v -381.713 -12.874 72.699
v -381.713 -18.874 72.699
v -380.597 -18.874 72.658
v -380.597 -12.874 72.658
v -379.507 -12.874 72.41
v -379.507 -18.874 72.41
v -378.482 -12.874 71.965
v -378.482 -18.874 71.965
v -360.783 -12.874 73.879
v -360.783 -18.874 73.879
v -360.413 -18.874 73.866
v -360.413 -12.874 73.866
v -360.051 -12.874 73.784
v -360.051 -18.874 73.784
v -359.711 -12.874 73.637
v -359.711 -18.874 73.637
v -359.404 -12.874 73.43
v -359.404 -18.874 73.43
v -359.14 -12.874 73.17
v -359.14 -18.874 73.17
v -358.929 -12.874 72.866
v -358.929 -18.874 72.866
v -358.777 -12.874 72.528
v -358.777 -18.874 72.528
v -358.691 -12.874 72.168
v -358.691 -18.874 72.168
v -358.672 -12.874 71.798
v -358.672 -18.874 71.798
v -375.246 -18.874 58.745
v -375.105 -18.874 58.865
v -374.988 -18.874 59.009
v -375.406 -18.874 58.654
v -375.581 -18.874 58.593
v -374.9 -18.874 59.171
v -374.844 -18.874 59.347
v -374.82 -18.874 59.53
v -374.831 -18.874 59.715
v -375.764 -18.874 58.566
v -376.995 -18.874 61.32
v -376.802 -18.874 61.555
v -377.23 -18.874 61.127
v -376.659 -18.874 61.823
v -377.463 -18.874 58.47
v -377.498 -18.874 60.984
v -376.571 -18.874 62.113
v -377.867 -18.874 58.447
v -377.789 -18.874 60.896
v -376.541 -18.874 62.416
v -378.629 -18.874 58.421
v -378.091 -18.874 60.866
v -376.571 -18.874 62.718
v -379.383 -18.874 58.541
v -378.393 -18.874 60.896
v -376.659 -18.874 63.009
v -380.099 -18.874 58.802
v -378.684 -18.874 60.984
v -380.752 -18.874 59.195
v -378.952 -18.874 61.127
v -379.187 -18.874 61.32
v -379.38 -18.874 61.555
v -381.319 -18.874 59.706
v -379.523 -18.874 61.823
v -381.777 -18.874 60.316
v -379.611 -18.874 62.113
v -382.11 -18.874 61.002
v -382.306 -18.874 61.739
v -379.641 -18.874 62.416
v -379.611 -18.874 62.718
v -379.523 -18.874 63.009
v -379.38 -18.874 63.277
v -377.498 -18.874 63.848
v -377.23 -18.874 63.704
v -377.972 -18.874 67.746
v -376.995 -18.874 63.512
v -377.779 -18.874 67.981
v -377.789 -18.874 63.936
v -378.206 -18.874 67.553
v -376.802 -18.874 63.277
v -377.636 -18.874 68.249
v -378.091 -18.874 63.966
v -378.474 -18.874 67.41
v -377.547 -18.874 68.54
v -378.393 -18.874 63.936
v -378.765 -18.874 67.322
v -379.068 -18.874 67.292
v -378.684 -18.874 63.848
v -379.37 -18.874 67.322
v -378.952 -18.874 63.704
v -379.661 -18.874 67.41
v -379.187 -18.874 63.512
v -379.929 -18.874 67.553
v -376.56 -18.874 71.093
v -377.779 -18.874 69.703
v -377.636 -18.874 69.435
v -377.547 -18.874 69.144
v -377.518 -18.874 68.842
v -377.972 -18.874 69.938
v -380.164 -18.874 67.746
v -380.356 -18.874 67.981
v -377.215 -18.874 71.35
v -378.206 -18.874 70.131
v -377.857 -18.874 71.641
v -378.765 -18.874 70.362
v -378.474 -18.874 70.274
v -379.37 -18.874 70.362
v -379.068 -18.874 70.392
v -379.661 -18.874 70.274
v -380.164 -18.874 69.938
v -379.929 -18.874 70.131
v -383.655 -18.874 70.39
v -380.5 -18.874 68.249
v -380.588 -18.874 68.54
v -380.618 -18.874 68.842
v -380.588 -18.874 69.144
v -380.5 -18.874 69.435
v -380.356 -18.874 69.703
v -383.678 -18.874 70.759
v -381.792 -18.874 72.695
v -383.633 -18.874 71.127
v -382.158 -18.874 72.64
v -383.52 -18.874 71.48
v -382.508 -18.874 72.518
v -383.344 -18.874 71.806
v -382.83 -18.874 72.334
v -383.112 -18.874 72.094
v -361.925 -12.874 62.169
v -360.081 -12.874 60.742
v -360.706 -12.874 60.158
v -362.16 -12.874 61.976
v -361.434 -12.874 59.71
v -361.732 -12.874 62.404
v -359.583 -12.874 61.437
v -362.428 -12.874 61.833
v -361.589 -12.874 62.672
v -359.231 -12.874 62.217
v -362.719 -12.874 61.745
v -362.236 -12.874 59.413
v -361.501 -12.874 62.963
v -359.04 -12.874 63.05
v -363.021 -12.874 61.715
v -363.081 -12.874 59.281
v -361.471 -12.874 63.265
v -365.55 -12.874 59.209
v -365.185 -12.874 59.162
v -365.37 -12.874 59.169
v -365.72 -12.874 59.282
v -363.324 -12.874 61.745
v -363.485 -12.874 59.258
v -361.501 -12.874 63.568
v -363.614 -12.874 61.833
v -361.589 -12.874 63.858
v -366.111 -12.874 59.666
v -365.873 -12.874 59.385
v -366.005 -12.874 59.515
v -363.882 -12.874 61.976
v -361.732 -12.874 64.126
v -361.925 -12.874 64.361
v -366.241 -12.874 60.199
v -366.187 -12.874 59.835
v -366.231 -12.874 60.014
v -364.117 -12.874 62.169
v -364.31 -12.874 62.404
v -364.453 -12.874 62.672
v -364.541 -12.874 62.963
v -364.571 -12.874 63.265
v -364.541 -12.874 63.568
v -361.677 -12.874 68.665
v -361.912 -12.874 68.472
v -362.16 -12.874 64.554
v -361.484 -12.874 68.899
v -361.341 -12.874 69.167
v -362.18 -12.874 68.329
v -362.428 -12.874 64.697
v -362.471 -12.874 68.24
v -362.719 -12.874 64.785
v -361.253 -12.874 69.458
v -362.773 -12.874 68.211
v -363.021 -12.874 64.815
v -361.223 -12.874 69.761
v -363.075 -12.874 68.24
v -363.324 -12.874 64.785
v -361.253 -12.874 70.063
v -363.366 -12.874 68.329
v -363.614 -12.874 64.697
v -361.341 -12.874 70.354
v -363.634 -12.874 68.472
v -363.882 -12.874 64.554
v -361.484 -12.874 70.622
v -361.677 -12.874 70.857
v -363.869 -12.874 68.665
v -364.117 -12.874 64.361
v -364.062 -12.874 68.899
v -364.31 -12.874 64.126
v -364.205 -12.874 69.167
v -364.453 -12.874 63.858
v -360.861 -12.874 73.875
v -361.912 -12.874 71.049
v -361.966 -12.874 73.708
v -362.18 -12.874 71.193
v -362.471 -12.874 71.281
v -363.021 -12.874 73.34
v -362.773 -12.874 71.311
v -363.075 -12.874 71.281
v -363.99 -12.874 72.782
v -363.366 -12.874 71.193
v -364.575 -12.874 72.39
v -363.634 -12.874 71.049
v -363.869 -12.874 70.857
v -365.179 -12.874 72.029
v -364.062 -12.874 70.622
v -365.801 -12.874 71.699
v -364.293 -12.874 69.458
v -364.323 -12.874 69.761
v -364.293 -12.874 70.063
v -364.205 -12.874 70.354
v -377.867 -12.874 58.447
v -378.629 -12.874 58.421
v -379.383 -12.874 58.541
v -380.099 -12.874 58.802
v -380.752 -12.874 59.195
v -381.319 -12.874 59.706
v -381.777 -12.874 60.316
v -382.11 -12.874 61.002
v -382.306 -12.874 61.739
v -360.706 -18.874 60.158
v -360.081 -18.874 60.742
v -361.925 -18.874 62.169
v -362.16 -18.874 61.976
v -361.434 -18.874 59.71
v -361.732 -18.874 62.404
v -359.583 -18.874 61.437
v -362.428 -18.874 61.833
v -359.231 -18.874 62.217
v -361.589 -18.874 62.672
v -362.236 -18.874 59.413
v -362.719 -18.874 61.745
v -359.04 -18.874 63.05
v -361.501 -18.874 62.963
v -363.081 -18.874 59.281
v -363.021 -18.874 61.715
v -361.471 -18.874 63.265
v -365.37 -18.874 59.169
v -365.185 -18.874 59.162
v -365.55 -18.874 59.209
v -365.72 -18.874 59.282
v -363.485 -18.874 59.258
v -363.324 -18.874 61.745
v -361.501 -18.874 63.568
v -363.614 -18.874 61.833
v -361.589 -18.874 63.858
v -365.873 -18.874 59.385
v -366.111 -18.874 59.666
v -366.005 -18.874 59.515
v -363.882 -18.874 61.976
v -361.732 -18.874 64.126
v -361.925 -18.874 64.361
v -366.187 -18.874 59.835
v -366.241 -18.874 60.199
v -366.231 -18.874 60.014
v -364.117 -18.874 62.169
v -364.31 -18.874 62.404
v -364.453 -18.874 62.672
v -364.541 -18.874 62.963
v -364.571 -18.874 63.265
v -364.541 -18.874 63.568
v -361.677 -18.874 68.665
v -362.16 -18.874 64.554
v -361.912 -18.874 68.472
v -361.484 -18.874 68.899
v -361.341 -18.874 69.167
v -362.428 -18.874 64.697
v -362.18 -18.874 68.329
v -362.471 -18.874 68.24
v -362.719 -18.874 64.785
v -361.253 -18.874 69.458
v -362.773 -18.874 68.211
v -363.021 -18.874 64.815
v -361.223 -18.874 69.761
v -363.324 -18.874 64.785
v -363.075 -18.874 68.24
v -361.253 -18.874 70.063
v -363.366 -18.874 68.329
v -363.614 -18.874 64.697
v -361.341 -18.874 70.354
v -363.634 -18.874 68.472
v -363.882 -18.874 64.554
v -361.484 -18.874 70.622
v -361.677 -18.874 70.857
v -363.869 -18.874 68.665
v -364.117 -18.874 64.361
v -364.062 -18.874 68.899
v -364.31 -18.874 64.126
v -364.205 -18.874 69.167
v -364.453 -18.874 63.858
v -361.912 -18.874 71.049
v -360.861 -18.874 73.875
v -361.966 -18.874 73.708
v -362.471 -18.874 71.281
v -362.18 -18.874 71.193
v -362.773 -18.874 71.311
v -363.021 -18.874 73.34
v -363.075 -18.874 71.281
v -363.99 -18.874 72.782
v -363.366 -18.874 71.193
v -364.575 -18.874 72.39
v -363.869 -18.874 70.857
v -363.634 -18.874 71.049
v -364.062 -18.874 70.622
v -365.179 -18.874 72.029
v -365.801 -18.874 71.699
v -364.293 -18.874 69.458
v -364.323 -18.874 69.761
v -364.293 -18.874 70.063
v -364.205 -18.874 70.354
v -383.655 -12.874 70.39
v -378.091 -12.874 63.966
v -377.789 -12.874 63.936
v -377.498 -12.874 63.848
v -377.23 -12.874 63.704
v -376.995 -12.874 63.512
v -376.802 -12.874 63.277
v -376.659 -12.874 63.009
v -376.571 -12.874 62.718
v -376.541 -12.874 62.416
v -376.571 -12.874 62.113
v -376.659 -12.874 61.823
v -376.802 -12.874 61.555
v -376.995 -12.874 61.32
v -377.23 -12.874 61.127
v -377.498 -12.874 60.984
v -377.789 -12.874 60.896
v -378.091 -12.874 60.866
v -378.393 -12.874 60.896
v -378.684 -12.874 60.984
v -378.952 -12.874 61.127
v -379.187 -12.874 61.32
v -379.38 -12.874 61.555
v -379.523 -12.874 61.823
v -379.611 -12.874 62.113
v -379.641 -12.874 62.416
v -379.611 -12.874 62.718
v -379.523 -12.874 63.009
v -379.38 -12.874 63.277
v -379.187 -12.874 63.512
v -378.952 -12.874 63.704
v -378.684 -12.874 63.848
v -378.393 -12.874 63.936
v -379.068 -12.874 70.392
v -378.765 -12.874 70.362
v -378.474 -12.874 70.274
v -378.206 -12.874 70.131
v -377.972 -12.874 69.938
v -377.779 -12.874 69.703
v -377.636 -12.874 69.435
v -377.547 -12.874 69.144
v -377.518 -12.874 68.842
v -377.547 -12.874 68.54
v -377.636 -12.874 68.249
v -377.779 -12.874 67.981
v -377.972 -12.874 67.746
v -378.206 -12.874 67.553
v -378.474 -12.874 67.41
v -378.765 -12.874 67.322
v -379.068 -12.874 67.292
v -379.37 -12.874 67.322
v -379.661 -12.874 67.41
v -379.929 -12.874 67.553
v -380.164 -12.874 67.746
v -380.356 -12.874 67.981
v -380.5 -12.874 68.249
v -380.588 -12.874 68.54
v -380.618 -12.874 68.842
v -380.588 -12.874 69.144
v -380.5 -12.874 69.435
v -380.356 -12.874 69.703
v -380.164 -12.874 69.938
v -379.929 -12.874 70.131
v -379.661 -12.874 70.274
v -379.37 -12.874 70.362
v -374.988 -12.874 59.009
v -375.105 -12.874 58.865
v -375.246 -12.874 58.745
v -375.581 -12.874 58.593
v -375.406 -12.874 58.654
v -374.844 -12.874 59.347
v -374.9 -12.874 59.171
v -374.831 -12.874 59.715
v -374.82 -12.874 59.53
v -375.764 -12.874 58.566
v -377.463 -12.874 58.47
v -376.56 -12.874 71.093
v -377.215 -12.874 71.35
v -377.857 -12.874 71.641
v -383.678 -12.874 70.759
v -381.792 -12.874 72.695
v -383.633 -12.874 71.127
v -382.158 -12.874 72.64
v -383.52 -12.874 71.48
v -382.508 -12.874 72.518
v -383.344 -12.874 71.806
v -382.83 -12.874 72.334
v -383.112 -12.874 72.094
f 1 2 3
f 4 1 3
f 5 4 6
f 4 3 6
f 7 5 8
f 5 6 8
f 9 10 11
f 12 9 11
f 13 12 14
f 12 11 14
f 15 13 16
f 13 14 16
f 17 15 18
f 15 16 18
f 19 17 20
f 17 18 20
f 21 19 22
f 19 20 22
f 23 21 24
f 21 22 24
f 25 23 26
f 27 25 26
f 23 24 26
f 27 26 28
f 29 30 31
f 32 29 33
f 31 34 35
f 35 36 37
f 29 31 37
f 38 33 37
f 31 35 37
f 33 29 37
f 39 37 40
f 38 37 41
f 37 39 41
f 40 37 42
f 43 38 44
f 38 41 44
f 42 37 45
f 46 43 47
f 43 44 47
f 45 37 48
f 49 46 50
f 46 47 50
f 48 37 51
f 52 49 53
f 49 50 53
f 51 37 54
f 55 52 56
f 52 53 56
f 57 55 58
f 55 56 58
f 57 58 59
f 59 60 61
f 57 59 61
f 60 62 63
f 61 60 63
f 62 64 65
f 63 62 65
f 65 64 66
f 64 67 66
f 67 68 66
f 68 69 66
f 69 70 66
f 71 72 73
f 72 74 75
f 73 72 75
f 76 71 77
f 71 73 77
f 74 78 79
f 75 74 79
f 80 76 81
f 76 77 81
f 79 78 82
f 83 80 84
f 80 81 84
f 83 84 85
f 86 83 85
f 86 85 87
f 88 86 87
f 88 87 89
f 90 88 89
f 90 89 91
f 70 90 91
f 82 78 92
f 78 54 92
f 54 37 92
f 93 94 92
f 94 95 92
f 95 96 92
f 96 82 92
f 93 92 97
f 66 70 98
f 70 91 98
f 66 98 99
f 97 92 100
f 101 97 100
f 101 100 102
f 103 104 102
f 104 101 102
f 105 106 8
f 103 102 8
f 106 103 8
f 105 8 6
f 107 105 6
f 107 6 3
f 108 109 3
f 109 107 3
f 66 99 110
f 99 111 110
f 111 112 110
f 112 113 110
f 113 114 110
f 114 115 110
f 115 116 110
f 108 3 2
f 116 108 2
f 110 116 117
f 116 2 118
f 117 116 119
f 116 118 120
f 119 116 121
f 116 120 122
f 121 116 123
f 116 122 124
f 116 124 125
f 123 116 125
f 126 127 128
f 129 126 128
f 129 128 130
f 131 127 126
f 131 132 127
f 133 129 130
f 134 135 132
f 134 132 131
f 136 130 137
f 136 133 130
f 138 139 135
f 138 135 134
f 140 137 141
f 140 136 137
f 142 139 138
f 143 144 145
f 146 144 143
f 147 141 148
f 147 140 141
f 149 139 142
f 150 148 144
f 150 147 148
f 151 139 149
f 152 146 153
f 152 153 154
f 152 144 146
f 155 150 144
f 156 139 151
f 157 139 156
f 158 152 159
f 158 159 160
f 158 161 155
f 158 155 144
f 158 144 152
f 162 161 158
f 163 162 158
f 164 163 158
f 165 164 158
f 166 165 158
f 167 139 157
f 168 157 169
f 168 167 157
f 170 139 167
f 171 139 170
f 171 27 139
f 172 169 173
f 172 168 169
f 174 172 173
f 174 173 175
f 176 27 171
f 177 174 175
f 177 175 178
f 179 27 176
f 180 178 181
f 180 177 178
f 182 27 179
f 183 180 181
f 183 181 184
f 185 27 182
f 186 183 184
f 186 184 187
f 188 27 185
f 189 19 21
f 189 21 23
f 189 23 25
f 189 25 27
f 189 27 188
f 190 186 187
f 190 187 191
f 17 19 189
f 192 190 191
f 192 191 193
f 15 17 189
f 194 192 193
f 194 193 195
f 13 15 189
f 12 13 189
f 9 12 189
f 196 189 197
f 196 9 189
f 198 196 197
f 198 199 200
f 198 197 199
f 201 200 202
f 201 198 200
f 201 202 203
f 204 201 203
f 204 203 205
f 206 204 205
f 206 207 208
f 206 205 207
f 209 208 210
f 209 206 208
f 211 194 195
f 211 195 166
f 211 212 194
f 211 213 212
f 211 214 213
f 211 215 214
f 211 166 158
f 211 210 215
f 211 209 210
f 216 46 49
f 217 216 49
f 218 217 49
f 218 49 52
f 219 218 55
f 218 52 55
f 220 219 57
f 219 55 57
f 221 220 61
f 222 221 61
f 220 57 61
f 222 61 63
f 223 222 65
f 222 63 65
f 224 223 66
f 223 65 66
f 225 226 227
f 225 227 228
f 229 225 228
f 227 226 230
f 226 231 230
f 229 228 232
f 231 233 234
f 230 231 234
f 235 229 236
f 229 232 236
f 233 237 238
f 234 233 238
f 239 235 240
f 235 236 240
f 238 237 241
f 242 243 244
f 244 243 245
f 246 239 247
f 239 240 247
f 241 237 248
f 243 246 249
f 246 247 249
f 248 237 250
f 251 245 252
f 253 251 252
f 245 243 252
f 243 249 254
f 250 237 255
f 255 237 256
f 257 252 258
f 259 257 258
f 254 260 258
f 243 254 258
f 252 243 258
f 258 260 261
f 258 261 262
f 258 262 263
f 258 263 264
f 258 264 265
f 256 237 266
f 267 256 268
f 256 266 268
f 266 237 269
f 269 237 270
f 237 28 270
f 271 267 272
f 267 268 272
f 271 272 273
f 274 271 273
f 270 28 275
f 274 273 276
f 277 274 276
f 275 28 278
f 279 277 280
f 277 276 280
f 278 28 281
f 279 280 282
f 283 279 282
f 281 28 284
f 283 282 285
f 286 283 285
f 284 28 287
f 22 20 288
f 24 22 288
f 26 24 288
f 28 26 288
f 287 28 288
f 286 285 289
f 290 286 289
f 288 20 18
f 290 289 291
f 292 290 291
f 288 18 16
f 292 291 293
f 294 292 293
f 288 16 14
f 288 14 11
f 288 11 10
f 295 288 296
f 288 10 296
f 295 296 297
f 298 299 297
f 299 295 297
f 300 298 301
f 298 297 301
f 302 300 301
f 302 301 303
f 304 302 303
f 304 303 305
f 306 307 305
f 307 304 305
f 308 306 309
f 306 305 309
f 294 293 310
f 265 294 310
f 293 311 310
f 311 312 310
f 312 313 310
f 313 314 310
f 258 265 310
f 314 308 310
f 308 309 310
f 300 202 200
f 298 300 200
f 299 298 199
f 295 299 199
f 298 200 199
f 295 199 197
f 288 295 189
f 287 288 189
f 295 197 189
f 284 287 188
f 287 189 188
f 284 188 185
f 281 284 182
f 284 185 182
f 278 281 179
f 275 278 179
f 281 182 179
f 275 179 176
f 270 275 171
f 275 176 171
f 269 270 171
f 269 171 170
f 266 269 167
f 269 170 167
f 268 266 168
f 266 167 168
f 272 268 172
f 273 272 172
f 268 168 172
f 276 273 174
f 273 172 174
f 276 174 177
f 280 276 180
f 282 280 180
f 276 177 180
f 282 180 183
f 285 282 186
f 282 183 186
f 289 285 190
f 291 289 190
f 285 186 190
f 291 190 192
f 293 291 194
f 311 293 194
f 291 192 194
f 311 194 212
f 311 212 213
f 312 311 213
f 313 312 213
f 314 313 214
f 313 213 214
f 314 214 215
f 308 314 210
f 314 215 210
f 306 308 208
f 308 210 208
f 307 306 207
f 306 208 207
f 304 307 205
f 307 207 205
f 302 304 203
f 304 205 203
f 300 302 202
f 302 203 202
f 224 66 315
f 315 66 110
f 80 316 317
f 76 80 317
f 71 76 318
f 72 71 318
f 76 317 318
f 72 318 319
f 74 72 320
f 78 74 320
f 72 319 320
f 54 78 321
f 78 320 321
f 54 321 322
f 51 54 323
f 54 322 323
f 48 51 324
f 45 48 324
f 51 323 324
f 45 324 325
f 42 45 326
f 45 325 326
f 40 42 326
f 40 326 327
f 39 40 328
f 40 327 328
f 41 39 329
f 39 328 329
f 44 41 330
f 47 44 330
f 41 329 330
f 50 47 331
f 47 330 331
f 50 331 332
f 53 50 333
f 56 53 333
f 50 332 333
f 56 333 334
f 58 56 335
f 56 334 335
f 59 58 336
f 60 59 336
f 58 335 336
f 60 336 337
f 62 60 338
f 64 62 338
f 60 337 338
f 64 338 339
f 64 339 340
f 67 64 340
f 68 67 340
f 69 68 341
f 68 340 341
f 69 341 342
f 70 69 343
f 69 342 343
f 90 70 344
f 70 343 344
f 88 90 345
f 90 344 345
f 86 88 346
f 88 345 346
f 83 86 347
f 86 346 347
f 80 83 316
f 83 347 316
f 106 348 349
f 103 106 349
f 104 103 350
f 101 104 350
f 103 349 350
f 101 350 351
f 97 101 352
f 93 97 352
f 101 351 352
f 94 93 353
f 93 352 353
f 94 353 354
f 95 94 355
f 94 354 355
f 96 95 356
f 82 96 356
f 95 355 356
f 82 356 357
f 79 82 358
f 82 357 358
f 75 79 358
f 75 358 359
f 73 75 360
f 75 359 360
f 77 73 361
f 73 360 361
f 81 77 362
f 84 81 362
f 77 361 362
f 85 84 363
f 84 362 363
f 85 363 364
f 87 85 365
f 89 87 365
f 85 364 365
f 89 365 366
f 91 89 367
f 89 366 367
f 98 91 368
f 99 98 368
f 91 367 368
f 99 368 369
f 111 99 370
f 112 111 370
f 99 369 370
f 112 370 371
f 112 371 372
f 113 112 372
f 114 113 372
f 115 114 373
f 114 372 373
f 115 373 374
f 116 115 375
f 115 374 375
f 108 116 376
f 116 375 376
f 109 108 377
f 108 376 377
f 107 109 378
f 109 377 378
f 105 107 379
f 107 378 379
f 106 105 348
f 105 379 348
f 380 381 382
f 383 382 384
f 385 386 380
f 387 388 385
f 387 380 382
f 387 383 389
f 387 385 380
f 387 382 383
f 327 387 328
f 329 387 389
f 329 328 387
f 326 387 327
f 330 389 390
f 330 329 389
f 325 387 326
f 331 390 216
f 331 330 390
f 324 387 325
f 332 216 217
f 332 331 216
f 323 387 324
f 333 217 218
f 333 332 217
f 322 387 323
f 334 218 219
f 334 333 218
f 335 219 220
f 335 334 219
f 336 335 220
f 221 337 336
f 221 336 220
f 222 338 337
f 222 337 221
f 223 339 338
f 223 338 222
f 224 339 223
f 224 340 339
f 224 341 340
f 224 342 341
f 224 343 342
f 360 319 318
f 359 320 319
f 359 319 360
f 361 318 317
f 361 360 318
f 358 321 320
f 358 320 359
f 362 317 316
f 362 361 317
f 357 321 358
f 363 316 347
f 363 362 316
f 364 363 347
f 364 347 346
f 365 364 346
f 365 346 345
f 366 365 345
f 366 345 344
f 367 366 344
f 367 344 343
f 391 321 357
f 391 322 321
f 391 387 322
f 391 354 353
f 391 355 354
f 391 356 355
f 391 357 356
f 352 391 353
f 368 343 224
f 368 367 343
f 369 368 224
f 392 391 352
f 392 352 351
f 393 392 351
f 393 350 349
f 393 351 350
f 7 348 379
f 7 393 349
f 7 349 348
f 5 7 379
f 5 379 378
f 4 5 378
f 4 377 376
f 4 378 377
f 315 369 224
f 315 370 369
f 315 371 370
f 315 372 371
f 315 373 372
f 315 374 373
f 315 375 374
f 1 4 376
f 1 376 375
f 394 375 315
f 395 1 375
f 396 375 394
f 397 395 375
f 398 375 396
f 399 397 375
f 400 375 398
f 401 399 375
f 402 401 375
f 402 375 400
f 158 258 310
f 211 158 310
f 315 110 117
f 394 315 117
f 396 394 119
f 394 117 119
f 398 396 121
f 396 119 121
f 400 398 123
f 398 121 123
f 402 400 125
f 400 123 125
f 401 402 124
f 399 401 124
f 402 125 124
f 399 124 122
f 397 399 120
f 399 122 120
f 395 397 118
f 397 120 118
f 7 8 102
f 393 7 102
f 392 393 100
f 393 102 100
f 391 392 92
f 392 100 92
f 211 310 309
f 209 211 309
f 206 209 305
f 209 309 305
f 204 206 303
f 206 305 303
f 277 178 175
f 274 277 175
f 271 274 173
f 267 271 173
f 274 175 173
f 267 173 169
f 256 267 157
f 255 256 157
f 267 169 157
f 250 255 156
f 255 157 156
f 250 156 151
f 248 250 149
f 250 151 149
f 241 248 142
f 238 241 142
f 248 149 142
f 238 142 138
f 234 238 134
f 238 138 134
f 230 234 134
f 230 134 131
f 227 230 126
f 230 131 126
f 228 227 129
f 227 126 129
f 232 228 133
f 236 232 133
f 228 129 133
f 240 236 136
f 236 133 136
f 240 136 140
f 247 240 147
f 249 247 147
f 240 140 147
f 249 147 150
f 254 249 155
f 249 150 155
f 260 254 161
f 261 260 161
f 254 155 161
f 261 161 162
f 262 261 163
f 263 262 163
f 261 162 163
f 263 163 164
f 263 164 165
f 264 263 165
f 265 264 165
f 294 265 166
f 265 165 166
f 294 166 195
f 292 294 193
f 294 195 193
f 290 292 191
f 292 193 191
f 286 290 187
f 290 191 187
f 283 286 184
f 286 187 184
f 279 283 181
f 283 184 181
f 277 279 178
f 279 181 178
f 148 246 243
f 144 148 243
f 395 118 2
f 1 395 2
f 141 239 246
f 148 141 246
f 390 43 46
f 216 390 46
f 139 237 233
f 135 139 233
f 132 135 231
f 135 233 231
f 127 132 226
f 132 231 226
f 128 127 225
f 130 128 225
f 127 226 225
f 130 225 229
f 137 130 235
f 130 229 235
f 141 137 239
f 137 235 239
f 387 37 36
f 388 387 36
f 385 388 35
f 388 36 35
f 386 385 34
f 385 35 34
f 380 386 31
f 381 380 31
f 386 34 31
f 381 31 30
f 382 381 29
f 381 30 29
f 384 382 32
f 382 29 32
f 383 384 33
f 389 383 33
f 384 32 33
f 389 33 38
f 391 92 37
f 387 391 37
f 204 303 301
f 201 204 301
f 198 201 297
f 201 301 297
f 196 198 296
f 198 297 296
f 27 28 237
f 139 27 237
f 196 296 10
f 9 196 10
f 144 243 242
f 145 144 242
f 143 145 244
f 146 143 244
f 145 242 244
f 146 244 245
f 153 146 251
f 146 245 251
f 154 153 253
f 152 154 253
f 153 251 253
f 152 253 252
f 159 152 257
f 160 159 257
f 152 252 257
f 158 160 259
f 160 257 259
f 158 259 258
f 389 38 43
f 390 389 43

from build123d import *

# Parameters (mm, degrees)
DODANIE_WYCI_GNI_CIE1_DEPTH   = 6
DODANIE_WYCI_GNI_CIE1_2_DEPTH = 6
SZKIC2_R                      = 1.55
WYTNIJ_WYCI_GNI_CIE1_DEPTH    = 6


with BuildPart() as part:
    # Szkic1 → Dodanie-wyciągnięcie1 (new body)
    with BuildSketch(Plane.XZ.offset(18.873993717)):
        with BuildLine():
            Line((-376.560022787, 71.092821297), (-374.831151718, 59.714534639))
            ThreePointArc((-374.831151718, 59.714534639), (-375.043393456, 58.934086873), (-375.763520627, 58.565899246))
            Line((-375.763520627, 58.565899246), (-377.463219092, 58.470082214))
            Line((-377.463219092, 58.470082214), (-377.867323557, 58.44730165))
            ThreePointArc((-377.867323557, 58.44730165), (-380.752416846, 59.195478513), (-382.306249359, 61.738928222))
            Line((-382.306249359, 61.738928222), (-383.655439175, 70.389689128))
            ThreePointArc((-383.655439175, 70.389689128), (-383.234620063, 71.955292457), (-381.791895571, 72.694716929))
            Line((-381.791895571, 72.694716929), (-381.713251764, 72.699150313))
            ThreePointArc((-381.713251764, 72.699150313), (-380.046026471, 72.55950463), (-378.482176857, 71.964932953))
            ThreePointArc((-378.482176857, 71.964932953), (-377.5379525, 71.491733437), (-376.560022787, 71.092821297))
        make_face()
    extrude(amount=-DODANIE_WYCI_GNI_CIE1_DEPTH)


with BuildPart() as body_2:
    # Szkic1 → Dodanie-wyci_gni_cie1 2 (new body)
    with BuildSketch(Plane.XZ.offset(18.873993717)):
        with BuildLine():
            Line((-366.240537331, 60.198833989), (-365.801162735, 71.699496113))
            ThreePointArc((-365.801162735, 71.699496113), (-364.874458275, 72.205709794), (-363.989579114, 72.781923572))
            ThreePointArc((-363.989579114, 72.781923572), (-362.502460733, 73.548487343), (-360.861493062, 73.874625653))
            Line((-360.861493062, 73.874625653), (-360.782849254, 73.879059037))
            ThreePointArc((-360.782849254, 73.879059037), (-359.266162416, 73.306465339), (-358.67205327, 71.798076519))
            Line((-358.67205327, 71.798076519), (-359.040446779, 63.050490359))
            ThreePointArc((-359.040446779, 63.050490359), (-360.378861081, 60.434579133), (-363.081307119, 59.280833149))
            Line((-363.081307119, 59.280833149), (-363.485411585, 59.258052584))
            Line((-363.485411585, 59.258052584), (-365.184982719, 59.162242731))
            ThreePointArc((-365.184982719, 59.162242731), (-365.941935052, 59.447170815), (-366.240537331, 60.198833989))
        make_face()
    extrude(amount=-DODANIE_WYCI_GNI_CIE1_2_DEPTH)


with BuildPart() as wytnij_wyci_gni_cie1_tool:
    # Szkic2 → Wytnij-wyciągnięcie1 (new body)
    with BuildSketch(Plane(origin=(0, -12.873993717, 0), x_dir=(-1, 0, 0), z_dir=(0, 1, 0))):
        with Locations(Location((378.091035143, 62.415721781, 0), (0, 0, 90))):
            Circle(SZKIC2_R)
        with Locations(Location((379.067604175, 68.841942515, 0), (0, 0, 90))):
            Circle(SZKIC2_R)
        with Locations(Location((363.021125314, 63.265257191, 0), (0, 0, 90))):
            Circle(SZKIC2_R)
        with Locations(Location((362.772978476, 69.760518782, 0), (0, 0, 90))):
            Circle(SZKIC2_R)
    extrude(amount=-WYTNIJ_WYCI_GNI_CIE1_DEPTH)


with BuildPart() as part_1:
    add(part.part)

    # Wytnij-wyciągnięcie1: cut by wytnij_wyci_gni_cie1_tool
    add(wytnij_wyci_gni_cie1_tool.part, mode=Mode.SUBTRACT)


with BuildPart() as body_2_1:
    add(body_2.part)

    # Wytnij-wyciągnięcie1: cut by wytnij_wyci_gni_cie1_tool
    add(wytnij_wyci_gni_cie1_tool.part, mode=Mode.SUBTRACT)


solid = Compound([part_1.part, body_2_1.part])
